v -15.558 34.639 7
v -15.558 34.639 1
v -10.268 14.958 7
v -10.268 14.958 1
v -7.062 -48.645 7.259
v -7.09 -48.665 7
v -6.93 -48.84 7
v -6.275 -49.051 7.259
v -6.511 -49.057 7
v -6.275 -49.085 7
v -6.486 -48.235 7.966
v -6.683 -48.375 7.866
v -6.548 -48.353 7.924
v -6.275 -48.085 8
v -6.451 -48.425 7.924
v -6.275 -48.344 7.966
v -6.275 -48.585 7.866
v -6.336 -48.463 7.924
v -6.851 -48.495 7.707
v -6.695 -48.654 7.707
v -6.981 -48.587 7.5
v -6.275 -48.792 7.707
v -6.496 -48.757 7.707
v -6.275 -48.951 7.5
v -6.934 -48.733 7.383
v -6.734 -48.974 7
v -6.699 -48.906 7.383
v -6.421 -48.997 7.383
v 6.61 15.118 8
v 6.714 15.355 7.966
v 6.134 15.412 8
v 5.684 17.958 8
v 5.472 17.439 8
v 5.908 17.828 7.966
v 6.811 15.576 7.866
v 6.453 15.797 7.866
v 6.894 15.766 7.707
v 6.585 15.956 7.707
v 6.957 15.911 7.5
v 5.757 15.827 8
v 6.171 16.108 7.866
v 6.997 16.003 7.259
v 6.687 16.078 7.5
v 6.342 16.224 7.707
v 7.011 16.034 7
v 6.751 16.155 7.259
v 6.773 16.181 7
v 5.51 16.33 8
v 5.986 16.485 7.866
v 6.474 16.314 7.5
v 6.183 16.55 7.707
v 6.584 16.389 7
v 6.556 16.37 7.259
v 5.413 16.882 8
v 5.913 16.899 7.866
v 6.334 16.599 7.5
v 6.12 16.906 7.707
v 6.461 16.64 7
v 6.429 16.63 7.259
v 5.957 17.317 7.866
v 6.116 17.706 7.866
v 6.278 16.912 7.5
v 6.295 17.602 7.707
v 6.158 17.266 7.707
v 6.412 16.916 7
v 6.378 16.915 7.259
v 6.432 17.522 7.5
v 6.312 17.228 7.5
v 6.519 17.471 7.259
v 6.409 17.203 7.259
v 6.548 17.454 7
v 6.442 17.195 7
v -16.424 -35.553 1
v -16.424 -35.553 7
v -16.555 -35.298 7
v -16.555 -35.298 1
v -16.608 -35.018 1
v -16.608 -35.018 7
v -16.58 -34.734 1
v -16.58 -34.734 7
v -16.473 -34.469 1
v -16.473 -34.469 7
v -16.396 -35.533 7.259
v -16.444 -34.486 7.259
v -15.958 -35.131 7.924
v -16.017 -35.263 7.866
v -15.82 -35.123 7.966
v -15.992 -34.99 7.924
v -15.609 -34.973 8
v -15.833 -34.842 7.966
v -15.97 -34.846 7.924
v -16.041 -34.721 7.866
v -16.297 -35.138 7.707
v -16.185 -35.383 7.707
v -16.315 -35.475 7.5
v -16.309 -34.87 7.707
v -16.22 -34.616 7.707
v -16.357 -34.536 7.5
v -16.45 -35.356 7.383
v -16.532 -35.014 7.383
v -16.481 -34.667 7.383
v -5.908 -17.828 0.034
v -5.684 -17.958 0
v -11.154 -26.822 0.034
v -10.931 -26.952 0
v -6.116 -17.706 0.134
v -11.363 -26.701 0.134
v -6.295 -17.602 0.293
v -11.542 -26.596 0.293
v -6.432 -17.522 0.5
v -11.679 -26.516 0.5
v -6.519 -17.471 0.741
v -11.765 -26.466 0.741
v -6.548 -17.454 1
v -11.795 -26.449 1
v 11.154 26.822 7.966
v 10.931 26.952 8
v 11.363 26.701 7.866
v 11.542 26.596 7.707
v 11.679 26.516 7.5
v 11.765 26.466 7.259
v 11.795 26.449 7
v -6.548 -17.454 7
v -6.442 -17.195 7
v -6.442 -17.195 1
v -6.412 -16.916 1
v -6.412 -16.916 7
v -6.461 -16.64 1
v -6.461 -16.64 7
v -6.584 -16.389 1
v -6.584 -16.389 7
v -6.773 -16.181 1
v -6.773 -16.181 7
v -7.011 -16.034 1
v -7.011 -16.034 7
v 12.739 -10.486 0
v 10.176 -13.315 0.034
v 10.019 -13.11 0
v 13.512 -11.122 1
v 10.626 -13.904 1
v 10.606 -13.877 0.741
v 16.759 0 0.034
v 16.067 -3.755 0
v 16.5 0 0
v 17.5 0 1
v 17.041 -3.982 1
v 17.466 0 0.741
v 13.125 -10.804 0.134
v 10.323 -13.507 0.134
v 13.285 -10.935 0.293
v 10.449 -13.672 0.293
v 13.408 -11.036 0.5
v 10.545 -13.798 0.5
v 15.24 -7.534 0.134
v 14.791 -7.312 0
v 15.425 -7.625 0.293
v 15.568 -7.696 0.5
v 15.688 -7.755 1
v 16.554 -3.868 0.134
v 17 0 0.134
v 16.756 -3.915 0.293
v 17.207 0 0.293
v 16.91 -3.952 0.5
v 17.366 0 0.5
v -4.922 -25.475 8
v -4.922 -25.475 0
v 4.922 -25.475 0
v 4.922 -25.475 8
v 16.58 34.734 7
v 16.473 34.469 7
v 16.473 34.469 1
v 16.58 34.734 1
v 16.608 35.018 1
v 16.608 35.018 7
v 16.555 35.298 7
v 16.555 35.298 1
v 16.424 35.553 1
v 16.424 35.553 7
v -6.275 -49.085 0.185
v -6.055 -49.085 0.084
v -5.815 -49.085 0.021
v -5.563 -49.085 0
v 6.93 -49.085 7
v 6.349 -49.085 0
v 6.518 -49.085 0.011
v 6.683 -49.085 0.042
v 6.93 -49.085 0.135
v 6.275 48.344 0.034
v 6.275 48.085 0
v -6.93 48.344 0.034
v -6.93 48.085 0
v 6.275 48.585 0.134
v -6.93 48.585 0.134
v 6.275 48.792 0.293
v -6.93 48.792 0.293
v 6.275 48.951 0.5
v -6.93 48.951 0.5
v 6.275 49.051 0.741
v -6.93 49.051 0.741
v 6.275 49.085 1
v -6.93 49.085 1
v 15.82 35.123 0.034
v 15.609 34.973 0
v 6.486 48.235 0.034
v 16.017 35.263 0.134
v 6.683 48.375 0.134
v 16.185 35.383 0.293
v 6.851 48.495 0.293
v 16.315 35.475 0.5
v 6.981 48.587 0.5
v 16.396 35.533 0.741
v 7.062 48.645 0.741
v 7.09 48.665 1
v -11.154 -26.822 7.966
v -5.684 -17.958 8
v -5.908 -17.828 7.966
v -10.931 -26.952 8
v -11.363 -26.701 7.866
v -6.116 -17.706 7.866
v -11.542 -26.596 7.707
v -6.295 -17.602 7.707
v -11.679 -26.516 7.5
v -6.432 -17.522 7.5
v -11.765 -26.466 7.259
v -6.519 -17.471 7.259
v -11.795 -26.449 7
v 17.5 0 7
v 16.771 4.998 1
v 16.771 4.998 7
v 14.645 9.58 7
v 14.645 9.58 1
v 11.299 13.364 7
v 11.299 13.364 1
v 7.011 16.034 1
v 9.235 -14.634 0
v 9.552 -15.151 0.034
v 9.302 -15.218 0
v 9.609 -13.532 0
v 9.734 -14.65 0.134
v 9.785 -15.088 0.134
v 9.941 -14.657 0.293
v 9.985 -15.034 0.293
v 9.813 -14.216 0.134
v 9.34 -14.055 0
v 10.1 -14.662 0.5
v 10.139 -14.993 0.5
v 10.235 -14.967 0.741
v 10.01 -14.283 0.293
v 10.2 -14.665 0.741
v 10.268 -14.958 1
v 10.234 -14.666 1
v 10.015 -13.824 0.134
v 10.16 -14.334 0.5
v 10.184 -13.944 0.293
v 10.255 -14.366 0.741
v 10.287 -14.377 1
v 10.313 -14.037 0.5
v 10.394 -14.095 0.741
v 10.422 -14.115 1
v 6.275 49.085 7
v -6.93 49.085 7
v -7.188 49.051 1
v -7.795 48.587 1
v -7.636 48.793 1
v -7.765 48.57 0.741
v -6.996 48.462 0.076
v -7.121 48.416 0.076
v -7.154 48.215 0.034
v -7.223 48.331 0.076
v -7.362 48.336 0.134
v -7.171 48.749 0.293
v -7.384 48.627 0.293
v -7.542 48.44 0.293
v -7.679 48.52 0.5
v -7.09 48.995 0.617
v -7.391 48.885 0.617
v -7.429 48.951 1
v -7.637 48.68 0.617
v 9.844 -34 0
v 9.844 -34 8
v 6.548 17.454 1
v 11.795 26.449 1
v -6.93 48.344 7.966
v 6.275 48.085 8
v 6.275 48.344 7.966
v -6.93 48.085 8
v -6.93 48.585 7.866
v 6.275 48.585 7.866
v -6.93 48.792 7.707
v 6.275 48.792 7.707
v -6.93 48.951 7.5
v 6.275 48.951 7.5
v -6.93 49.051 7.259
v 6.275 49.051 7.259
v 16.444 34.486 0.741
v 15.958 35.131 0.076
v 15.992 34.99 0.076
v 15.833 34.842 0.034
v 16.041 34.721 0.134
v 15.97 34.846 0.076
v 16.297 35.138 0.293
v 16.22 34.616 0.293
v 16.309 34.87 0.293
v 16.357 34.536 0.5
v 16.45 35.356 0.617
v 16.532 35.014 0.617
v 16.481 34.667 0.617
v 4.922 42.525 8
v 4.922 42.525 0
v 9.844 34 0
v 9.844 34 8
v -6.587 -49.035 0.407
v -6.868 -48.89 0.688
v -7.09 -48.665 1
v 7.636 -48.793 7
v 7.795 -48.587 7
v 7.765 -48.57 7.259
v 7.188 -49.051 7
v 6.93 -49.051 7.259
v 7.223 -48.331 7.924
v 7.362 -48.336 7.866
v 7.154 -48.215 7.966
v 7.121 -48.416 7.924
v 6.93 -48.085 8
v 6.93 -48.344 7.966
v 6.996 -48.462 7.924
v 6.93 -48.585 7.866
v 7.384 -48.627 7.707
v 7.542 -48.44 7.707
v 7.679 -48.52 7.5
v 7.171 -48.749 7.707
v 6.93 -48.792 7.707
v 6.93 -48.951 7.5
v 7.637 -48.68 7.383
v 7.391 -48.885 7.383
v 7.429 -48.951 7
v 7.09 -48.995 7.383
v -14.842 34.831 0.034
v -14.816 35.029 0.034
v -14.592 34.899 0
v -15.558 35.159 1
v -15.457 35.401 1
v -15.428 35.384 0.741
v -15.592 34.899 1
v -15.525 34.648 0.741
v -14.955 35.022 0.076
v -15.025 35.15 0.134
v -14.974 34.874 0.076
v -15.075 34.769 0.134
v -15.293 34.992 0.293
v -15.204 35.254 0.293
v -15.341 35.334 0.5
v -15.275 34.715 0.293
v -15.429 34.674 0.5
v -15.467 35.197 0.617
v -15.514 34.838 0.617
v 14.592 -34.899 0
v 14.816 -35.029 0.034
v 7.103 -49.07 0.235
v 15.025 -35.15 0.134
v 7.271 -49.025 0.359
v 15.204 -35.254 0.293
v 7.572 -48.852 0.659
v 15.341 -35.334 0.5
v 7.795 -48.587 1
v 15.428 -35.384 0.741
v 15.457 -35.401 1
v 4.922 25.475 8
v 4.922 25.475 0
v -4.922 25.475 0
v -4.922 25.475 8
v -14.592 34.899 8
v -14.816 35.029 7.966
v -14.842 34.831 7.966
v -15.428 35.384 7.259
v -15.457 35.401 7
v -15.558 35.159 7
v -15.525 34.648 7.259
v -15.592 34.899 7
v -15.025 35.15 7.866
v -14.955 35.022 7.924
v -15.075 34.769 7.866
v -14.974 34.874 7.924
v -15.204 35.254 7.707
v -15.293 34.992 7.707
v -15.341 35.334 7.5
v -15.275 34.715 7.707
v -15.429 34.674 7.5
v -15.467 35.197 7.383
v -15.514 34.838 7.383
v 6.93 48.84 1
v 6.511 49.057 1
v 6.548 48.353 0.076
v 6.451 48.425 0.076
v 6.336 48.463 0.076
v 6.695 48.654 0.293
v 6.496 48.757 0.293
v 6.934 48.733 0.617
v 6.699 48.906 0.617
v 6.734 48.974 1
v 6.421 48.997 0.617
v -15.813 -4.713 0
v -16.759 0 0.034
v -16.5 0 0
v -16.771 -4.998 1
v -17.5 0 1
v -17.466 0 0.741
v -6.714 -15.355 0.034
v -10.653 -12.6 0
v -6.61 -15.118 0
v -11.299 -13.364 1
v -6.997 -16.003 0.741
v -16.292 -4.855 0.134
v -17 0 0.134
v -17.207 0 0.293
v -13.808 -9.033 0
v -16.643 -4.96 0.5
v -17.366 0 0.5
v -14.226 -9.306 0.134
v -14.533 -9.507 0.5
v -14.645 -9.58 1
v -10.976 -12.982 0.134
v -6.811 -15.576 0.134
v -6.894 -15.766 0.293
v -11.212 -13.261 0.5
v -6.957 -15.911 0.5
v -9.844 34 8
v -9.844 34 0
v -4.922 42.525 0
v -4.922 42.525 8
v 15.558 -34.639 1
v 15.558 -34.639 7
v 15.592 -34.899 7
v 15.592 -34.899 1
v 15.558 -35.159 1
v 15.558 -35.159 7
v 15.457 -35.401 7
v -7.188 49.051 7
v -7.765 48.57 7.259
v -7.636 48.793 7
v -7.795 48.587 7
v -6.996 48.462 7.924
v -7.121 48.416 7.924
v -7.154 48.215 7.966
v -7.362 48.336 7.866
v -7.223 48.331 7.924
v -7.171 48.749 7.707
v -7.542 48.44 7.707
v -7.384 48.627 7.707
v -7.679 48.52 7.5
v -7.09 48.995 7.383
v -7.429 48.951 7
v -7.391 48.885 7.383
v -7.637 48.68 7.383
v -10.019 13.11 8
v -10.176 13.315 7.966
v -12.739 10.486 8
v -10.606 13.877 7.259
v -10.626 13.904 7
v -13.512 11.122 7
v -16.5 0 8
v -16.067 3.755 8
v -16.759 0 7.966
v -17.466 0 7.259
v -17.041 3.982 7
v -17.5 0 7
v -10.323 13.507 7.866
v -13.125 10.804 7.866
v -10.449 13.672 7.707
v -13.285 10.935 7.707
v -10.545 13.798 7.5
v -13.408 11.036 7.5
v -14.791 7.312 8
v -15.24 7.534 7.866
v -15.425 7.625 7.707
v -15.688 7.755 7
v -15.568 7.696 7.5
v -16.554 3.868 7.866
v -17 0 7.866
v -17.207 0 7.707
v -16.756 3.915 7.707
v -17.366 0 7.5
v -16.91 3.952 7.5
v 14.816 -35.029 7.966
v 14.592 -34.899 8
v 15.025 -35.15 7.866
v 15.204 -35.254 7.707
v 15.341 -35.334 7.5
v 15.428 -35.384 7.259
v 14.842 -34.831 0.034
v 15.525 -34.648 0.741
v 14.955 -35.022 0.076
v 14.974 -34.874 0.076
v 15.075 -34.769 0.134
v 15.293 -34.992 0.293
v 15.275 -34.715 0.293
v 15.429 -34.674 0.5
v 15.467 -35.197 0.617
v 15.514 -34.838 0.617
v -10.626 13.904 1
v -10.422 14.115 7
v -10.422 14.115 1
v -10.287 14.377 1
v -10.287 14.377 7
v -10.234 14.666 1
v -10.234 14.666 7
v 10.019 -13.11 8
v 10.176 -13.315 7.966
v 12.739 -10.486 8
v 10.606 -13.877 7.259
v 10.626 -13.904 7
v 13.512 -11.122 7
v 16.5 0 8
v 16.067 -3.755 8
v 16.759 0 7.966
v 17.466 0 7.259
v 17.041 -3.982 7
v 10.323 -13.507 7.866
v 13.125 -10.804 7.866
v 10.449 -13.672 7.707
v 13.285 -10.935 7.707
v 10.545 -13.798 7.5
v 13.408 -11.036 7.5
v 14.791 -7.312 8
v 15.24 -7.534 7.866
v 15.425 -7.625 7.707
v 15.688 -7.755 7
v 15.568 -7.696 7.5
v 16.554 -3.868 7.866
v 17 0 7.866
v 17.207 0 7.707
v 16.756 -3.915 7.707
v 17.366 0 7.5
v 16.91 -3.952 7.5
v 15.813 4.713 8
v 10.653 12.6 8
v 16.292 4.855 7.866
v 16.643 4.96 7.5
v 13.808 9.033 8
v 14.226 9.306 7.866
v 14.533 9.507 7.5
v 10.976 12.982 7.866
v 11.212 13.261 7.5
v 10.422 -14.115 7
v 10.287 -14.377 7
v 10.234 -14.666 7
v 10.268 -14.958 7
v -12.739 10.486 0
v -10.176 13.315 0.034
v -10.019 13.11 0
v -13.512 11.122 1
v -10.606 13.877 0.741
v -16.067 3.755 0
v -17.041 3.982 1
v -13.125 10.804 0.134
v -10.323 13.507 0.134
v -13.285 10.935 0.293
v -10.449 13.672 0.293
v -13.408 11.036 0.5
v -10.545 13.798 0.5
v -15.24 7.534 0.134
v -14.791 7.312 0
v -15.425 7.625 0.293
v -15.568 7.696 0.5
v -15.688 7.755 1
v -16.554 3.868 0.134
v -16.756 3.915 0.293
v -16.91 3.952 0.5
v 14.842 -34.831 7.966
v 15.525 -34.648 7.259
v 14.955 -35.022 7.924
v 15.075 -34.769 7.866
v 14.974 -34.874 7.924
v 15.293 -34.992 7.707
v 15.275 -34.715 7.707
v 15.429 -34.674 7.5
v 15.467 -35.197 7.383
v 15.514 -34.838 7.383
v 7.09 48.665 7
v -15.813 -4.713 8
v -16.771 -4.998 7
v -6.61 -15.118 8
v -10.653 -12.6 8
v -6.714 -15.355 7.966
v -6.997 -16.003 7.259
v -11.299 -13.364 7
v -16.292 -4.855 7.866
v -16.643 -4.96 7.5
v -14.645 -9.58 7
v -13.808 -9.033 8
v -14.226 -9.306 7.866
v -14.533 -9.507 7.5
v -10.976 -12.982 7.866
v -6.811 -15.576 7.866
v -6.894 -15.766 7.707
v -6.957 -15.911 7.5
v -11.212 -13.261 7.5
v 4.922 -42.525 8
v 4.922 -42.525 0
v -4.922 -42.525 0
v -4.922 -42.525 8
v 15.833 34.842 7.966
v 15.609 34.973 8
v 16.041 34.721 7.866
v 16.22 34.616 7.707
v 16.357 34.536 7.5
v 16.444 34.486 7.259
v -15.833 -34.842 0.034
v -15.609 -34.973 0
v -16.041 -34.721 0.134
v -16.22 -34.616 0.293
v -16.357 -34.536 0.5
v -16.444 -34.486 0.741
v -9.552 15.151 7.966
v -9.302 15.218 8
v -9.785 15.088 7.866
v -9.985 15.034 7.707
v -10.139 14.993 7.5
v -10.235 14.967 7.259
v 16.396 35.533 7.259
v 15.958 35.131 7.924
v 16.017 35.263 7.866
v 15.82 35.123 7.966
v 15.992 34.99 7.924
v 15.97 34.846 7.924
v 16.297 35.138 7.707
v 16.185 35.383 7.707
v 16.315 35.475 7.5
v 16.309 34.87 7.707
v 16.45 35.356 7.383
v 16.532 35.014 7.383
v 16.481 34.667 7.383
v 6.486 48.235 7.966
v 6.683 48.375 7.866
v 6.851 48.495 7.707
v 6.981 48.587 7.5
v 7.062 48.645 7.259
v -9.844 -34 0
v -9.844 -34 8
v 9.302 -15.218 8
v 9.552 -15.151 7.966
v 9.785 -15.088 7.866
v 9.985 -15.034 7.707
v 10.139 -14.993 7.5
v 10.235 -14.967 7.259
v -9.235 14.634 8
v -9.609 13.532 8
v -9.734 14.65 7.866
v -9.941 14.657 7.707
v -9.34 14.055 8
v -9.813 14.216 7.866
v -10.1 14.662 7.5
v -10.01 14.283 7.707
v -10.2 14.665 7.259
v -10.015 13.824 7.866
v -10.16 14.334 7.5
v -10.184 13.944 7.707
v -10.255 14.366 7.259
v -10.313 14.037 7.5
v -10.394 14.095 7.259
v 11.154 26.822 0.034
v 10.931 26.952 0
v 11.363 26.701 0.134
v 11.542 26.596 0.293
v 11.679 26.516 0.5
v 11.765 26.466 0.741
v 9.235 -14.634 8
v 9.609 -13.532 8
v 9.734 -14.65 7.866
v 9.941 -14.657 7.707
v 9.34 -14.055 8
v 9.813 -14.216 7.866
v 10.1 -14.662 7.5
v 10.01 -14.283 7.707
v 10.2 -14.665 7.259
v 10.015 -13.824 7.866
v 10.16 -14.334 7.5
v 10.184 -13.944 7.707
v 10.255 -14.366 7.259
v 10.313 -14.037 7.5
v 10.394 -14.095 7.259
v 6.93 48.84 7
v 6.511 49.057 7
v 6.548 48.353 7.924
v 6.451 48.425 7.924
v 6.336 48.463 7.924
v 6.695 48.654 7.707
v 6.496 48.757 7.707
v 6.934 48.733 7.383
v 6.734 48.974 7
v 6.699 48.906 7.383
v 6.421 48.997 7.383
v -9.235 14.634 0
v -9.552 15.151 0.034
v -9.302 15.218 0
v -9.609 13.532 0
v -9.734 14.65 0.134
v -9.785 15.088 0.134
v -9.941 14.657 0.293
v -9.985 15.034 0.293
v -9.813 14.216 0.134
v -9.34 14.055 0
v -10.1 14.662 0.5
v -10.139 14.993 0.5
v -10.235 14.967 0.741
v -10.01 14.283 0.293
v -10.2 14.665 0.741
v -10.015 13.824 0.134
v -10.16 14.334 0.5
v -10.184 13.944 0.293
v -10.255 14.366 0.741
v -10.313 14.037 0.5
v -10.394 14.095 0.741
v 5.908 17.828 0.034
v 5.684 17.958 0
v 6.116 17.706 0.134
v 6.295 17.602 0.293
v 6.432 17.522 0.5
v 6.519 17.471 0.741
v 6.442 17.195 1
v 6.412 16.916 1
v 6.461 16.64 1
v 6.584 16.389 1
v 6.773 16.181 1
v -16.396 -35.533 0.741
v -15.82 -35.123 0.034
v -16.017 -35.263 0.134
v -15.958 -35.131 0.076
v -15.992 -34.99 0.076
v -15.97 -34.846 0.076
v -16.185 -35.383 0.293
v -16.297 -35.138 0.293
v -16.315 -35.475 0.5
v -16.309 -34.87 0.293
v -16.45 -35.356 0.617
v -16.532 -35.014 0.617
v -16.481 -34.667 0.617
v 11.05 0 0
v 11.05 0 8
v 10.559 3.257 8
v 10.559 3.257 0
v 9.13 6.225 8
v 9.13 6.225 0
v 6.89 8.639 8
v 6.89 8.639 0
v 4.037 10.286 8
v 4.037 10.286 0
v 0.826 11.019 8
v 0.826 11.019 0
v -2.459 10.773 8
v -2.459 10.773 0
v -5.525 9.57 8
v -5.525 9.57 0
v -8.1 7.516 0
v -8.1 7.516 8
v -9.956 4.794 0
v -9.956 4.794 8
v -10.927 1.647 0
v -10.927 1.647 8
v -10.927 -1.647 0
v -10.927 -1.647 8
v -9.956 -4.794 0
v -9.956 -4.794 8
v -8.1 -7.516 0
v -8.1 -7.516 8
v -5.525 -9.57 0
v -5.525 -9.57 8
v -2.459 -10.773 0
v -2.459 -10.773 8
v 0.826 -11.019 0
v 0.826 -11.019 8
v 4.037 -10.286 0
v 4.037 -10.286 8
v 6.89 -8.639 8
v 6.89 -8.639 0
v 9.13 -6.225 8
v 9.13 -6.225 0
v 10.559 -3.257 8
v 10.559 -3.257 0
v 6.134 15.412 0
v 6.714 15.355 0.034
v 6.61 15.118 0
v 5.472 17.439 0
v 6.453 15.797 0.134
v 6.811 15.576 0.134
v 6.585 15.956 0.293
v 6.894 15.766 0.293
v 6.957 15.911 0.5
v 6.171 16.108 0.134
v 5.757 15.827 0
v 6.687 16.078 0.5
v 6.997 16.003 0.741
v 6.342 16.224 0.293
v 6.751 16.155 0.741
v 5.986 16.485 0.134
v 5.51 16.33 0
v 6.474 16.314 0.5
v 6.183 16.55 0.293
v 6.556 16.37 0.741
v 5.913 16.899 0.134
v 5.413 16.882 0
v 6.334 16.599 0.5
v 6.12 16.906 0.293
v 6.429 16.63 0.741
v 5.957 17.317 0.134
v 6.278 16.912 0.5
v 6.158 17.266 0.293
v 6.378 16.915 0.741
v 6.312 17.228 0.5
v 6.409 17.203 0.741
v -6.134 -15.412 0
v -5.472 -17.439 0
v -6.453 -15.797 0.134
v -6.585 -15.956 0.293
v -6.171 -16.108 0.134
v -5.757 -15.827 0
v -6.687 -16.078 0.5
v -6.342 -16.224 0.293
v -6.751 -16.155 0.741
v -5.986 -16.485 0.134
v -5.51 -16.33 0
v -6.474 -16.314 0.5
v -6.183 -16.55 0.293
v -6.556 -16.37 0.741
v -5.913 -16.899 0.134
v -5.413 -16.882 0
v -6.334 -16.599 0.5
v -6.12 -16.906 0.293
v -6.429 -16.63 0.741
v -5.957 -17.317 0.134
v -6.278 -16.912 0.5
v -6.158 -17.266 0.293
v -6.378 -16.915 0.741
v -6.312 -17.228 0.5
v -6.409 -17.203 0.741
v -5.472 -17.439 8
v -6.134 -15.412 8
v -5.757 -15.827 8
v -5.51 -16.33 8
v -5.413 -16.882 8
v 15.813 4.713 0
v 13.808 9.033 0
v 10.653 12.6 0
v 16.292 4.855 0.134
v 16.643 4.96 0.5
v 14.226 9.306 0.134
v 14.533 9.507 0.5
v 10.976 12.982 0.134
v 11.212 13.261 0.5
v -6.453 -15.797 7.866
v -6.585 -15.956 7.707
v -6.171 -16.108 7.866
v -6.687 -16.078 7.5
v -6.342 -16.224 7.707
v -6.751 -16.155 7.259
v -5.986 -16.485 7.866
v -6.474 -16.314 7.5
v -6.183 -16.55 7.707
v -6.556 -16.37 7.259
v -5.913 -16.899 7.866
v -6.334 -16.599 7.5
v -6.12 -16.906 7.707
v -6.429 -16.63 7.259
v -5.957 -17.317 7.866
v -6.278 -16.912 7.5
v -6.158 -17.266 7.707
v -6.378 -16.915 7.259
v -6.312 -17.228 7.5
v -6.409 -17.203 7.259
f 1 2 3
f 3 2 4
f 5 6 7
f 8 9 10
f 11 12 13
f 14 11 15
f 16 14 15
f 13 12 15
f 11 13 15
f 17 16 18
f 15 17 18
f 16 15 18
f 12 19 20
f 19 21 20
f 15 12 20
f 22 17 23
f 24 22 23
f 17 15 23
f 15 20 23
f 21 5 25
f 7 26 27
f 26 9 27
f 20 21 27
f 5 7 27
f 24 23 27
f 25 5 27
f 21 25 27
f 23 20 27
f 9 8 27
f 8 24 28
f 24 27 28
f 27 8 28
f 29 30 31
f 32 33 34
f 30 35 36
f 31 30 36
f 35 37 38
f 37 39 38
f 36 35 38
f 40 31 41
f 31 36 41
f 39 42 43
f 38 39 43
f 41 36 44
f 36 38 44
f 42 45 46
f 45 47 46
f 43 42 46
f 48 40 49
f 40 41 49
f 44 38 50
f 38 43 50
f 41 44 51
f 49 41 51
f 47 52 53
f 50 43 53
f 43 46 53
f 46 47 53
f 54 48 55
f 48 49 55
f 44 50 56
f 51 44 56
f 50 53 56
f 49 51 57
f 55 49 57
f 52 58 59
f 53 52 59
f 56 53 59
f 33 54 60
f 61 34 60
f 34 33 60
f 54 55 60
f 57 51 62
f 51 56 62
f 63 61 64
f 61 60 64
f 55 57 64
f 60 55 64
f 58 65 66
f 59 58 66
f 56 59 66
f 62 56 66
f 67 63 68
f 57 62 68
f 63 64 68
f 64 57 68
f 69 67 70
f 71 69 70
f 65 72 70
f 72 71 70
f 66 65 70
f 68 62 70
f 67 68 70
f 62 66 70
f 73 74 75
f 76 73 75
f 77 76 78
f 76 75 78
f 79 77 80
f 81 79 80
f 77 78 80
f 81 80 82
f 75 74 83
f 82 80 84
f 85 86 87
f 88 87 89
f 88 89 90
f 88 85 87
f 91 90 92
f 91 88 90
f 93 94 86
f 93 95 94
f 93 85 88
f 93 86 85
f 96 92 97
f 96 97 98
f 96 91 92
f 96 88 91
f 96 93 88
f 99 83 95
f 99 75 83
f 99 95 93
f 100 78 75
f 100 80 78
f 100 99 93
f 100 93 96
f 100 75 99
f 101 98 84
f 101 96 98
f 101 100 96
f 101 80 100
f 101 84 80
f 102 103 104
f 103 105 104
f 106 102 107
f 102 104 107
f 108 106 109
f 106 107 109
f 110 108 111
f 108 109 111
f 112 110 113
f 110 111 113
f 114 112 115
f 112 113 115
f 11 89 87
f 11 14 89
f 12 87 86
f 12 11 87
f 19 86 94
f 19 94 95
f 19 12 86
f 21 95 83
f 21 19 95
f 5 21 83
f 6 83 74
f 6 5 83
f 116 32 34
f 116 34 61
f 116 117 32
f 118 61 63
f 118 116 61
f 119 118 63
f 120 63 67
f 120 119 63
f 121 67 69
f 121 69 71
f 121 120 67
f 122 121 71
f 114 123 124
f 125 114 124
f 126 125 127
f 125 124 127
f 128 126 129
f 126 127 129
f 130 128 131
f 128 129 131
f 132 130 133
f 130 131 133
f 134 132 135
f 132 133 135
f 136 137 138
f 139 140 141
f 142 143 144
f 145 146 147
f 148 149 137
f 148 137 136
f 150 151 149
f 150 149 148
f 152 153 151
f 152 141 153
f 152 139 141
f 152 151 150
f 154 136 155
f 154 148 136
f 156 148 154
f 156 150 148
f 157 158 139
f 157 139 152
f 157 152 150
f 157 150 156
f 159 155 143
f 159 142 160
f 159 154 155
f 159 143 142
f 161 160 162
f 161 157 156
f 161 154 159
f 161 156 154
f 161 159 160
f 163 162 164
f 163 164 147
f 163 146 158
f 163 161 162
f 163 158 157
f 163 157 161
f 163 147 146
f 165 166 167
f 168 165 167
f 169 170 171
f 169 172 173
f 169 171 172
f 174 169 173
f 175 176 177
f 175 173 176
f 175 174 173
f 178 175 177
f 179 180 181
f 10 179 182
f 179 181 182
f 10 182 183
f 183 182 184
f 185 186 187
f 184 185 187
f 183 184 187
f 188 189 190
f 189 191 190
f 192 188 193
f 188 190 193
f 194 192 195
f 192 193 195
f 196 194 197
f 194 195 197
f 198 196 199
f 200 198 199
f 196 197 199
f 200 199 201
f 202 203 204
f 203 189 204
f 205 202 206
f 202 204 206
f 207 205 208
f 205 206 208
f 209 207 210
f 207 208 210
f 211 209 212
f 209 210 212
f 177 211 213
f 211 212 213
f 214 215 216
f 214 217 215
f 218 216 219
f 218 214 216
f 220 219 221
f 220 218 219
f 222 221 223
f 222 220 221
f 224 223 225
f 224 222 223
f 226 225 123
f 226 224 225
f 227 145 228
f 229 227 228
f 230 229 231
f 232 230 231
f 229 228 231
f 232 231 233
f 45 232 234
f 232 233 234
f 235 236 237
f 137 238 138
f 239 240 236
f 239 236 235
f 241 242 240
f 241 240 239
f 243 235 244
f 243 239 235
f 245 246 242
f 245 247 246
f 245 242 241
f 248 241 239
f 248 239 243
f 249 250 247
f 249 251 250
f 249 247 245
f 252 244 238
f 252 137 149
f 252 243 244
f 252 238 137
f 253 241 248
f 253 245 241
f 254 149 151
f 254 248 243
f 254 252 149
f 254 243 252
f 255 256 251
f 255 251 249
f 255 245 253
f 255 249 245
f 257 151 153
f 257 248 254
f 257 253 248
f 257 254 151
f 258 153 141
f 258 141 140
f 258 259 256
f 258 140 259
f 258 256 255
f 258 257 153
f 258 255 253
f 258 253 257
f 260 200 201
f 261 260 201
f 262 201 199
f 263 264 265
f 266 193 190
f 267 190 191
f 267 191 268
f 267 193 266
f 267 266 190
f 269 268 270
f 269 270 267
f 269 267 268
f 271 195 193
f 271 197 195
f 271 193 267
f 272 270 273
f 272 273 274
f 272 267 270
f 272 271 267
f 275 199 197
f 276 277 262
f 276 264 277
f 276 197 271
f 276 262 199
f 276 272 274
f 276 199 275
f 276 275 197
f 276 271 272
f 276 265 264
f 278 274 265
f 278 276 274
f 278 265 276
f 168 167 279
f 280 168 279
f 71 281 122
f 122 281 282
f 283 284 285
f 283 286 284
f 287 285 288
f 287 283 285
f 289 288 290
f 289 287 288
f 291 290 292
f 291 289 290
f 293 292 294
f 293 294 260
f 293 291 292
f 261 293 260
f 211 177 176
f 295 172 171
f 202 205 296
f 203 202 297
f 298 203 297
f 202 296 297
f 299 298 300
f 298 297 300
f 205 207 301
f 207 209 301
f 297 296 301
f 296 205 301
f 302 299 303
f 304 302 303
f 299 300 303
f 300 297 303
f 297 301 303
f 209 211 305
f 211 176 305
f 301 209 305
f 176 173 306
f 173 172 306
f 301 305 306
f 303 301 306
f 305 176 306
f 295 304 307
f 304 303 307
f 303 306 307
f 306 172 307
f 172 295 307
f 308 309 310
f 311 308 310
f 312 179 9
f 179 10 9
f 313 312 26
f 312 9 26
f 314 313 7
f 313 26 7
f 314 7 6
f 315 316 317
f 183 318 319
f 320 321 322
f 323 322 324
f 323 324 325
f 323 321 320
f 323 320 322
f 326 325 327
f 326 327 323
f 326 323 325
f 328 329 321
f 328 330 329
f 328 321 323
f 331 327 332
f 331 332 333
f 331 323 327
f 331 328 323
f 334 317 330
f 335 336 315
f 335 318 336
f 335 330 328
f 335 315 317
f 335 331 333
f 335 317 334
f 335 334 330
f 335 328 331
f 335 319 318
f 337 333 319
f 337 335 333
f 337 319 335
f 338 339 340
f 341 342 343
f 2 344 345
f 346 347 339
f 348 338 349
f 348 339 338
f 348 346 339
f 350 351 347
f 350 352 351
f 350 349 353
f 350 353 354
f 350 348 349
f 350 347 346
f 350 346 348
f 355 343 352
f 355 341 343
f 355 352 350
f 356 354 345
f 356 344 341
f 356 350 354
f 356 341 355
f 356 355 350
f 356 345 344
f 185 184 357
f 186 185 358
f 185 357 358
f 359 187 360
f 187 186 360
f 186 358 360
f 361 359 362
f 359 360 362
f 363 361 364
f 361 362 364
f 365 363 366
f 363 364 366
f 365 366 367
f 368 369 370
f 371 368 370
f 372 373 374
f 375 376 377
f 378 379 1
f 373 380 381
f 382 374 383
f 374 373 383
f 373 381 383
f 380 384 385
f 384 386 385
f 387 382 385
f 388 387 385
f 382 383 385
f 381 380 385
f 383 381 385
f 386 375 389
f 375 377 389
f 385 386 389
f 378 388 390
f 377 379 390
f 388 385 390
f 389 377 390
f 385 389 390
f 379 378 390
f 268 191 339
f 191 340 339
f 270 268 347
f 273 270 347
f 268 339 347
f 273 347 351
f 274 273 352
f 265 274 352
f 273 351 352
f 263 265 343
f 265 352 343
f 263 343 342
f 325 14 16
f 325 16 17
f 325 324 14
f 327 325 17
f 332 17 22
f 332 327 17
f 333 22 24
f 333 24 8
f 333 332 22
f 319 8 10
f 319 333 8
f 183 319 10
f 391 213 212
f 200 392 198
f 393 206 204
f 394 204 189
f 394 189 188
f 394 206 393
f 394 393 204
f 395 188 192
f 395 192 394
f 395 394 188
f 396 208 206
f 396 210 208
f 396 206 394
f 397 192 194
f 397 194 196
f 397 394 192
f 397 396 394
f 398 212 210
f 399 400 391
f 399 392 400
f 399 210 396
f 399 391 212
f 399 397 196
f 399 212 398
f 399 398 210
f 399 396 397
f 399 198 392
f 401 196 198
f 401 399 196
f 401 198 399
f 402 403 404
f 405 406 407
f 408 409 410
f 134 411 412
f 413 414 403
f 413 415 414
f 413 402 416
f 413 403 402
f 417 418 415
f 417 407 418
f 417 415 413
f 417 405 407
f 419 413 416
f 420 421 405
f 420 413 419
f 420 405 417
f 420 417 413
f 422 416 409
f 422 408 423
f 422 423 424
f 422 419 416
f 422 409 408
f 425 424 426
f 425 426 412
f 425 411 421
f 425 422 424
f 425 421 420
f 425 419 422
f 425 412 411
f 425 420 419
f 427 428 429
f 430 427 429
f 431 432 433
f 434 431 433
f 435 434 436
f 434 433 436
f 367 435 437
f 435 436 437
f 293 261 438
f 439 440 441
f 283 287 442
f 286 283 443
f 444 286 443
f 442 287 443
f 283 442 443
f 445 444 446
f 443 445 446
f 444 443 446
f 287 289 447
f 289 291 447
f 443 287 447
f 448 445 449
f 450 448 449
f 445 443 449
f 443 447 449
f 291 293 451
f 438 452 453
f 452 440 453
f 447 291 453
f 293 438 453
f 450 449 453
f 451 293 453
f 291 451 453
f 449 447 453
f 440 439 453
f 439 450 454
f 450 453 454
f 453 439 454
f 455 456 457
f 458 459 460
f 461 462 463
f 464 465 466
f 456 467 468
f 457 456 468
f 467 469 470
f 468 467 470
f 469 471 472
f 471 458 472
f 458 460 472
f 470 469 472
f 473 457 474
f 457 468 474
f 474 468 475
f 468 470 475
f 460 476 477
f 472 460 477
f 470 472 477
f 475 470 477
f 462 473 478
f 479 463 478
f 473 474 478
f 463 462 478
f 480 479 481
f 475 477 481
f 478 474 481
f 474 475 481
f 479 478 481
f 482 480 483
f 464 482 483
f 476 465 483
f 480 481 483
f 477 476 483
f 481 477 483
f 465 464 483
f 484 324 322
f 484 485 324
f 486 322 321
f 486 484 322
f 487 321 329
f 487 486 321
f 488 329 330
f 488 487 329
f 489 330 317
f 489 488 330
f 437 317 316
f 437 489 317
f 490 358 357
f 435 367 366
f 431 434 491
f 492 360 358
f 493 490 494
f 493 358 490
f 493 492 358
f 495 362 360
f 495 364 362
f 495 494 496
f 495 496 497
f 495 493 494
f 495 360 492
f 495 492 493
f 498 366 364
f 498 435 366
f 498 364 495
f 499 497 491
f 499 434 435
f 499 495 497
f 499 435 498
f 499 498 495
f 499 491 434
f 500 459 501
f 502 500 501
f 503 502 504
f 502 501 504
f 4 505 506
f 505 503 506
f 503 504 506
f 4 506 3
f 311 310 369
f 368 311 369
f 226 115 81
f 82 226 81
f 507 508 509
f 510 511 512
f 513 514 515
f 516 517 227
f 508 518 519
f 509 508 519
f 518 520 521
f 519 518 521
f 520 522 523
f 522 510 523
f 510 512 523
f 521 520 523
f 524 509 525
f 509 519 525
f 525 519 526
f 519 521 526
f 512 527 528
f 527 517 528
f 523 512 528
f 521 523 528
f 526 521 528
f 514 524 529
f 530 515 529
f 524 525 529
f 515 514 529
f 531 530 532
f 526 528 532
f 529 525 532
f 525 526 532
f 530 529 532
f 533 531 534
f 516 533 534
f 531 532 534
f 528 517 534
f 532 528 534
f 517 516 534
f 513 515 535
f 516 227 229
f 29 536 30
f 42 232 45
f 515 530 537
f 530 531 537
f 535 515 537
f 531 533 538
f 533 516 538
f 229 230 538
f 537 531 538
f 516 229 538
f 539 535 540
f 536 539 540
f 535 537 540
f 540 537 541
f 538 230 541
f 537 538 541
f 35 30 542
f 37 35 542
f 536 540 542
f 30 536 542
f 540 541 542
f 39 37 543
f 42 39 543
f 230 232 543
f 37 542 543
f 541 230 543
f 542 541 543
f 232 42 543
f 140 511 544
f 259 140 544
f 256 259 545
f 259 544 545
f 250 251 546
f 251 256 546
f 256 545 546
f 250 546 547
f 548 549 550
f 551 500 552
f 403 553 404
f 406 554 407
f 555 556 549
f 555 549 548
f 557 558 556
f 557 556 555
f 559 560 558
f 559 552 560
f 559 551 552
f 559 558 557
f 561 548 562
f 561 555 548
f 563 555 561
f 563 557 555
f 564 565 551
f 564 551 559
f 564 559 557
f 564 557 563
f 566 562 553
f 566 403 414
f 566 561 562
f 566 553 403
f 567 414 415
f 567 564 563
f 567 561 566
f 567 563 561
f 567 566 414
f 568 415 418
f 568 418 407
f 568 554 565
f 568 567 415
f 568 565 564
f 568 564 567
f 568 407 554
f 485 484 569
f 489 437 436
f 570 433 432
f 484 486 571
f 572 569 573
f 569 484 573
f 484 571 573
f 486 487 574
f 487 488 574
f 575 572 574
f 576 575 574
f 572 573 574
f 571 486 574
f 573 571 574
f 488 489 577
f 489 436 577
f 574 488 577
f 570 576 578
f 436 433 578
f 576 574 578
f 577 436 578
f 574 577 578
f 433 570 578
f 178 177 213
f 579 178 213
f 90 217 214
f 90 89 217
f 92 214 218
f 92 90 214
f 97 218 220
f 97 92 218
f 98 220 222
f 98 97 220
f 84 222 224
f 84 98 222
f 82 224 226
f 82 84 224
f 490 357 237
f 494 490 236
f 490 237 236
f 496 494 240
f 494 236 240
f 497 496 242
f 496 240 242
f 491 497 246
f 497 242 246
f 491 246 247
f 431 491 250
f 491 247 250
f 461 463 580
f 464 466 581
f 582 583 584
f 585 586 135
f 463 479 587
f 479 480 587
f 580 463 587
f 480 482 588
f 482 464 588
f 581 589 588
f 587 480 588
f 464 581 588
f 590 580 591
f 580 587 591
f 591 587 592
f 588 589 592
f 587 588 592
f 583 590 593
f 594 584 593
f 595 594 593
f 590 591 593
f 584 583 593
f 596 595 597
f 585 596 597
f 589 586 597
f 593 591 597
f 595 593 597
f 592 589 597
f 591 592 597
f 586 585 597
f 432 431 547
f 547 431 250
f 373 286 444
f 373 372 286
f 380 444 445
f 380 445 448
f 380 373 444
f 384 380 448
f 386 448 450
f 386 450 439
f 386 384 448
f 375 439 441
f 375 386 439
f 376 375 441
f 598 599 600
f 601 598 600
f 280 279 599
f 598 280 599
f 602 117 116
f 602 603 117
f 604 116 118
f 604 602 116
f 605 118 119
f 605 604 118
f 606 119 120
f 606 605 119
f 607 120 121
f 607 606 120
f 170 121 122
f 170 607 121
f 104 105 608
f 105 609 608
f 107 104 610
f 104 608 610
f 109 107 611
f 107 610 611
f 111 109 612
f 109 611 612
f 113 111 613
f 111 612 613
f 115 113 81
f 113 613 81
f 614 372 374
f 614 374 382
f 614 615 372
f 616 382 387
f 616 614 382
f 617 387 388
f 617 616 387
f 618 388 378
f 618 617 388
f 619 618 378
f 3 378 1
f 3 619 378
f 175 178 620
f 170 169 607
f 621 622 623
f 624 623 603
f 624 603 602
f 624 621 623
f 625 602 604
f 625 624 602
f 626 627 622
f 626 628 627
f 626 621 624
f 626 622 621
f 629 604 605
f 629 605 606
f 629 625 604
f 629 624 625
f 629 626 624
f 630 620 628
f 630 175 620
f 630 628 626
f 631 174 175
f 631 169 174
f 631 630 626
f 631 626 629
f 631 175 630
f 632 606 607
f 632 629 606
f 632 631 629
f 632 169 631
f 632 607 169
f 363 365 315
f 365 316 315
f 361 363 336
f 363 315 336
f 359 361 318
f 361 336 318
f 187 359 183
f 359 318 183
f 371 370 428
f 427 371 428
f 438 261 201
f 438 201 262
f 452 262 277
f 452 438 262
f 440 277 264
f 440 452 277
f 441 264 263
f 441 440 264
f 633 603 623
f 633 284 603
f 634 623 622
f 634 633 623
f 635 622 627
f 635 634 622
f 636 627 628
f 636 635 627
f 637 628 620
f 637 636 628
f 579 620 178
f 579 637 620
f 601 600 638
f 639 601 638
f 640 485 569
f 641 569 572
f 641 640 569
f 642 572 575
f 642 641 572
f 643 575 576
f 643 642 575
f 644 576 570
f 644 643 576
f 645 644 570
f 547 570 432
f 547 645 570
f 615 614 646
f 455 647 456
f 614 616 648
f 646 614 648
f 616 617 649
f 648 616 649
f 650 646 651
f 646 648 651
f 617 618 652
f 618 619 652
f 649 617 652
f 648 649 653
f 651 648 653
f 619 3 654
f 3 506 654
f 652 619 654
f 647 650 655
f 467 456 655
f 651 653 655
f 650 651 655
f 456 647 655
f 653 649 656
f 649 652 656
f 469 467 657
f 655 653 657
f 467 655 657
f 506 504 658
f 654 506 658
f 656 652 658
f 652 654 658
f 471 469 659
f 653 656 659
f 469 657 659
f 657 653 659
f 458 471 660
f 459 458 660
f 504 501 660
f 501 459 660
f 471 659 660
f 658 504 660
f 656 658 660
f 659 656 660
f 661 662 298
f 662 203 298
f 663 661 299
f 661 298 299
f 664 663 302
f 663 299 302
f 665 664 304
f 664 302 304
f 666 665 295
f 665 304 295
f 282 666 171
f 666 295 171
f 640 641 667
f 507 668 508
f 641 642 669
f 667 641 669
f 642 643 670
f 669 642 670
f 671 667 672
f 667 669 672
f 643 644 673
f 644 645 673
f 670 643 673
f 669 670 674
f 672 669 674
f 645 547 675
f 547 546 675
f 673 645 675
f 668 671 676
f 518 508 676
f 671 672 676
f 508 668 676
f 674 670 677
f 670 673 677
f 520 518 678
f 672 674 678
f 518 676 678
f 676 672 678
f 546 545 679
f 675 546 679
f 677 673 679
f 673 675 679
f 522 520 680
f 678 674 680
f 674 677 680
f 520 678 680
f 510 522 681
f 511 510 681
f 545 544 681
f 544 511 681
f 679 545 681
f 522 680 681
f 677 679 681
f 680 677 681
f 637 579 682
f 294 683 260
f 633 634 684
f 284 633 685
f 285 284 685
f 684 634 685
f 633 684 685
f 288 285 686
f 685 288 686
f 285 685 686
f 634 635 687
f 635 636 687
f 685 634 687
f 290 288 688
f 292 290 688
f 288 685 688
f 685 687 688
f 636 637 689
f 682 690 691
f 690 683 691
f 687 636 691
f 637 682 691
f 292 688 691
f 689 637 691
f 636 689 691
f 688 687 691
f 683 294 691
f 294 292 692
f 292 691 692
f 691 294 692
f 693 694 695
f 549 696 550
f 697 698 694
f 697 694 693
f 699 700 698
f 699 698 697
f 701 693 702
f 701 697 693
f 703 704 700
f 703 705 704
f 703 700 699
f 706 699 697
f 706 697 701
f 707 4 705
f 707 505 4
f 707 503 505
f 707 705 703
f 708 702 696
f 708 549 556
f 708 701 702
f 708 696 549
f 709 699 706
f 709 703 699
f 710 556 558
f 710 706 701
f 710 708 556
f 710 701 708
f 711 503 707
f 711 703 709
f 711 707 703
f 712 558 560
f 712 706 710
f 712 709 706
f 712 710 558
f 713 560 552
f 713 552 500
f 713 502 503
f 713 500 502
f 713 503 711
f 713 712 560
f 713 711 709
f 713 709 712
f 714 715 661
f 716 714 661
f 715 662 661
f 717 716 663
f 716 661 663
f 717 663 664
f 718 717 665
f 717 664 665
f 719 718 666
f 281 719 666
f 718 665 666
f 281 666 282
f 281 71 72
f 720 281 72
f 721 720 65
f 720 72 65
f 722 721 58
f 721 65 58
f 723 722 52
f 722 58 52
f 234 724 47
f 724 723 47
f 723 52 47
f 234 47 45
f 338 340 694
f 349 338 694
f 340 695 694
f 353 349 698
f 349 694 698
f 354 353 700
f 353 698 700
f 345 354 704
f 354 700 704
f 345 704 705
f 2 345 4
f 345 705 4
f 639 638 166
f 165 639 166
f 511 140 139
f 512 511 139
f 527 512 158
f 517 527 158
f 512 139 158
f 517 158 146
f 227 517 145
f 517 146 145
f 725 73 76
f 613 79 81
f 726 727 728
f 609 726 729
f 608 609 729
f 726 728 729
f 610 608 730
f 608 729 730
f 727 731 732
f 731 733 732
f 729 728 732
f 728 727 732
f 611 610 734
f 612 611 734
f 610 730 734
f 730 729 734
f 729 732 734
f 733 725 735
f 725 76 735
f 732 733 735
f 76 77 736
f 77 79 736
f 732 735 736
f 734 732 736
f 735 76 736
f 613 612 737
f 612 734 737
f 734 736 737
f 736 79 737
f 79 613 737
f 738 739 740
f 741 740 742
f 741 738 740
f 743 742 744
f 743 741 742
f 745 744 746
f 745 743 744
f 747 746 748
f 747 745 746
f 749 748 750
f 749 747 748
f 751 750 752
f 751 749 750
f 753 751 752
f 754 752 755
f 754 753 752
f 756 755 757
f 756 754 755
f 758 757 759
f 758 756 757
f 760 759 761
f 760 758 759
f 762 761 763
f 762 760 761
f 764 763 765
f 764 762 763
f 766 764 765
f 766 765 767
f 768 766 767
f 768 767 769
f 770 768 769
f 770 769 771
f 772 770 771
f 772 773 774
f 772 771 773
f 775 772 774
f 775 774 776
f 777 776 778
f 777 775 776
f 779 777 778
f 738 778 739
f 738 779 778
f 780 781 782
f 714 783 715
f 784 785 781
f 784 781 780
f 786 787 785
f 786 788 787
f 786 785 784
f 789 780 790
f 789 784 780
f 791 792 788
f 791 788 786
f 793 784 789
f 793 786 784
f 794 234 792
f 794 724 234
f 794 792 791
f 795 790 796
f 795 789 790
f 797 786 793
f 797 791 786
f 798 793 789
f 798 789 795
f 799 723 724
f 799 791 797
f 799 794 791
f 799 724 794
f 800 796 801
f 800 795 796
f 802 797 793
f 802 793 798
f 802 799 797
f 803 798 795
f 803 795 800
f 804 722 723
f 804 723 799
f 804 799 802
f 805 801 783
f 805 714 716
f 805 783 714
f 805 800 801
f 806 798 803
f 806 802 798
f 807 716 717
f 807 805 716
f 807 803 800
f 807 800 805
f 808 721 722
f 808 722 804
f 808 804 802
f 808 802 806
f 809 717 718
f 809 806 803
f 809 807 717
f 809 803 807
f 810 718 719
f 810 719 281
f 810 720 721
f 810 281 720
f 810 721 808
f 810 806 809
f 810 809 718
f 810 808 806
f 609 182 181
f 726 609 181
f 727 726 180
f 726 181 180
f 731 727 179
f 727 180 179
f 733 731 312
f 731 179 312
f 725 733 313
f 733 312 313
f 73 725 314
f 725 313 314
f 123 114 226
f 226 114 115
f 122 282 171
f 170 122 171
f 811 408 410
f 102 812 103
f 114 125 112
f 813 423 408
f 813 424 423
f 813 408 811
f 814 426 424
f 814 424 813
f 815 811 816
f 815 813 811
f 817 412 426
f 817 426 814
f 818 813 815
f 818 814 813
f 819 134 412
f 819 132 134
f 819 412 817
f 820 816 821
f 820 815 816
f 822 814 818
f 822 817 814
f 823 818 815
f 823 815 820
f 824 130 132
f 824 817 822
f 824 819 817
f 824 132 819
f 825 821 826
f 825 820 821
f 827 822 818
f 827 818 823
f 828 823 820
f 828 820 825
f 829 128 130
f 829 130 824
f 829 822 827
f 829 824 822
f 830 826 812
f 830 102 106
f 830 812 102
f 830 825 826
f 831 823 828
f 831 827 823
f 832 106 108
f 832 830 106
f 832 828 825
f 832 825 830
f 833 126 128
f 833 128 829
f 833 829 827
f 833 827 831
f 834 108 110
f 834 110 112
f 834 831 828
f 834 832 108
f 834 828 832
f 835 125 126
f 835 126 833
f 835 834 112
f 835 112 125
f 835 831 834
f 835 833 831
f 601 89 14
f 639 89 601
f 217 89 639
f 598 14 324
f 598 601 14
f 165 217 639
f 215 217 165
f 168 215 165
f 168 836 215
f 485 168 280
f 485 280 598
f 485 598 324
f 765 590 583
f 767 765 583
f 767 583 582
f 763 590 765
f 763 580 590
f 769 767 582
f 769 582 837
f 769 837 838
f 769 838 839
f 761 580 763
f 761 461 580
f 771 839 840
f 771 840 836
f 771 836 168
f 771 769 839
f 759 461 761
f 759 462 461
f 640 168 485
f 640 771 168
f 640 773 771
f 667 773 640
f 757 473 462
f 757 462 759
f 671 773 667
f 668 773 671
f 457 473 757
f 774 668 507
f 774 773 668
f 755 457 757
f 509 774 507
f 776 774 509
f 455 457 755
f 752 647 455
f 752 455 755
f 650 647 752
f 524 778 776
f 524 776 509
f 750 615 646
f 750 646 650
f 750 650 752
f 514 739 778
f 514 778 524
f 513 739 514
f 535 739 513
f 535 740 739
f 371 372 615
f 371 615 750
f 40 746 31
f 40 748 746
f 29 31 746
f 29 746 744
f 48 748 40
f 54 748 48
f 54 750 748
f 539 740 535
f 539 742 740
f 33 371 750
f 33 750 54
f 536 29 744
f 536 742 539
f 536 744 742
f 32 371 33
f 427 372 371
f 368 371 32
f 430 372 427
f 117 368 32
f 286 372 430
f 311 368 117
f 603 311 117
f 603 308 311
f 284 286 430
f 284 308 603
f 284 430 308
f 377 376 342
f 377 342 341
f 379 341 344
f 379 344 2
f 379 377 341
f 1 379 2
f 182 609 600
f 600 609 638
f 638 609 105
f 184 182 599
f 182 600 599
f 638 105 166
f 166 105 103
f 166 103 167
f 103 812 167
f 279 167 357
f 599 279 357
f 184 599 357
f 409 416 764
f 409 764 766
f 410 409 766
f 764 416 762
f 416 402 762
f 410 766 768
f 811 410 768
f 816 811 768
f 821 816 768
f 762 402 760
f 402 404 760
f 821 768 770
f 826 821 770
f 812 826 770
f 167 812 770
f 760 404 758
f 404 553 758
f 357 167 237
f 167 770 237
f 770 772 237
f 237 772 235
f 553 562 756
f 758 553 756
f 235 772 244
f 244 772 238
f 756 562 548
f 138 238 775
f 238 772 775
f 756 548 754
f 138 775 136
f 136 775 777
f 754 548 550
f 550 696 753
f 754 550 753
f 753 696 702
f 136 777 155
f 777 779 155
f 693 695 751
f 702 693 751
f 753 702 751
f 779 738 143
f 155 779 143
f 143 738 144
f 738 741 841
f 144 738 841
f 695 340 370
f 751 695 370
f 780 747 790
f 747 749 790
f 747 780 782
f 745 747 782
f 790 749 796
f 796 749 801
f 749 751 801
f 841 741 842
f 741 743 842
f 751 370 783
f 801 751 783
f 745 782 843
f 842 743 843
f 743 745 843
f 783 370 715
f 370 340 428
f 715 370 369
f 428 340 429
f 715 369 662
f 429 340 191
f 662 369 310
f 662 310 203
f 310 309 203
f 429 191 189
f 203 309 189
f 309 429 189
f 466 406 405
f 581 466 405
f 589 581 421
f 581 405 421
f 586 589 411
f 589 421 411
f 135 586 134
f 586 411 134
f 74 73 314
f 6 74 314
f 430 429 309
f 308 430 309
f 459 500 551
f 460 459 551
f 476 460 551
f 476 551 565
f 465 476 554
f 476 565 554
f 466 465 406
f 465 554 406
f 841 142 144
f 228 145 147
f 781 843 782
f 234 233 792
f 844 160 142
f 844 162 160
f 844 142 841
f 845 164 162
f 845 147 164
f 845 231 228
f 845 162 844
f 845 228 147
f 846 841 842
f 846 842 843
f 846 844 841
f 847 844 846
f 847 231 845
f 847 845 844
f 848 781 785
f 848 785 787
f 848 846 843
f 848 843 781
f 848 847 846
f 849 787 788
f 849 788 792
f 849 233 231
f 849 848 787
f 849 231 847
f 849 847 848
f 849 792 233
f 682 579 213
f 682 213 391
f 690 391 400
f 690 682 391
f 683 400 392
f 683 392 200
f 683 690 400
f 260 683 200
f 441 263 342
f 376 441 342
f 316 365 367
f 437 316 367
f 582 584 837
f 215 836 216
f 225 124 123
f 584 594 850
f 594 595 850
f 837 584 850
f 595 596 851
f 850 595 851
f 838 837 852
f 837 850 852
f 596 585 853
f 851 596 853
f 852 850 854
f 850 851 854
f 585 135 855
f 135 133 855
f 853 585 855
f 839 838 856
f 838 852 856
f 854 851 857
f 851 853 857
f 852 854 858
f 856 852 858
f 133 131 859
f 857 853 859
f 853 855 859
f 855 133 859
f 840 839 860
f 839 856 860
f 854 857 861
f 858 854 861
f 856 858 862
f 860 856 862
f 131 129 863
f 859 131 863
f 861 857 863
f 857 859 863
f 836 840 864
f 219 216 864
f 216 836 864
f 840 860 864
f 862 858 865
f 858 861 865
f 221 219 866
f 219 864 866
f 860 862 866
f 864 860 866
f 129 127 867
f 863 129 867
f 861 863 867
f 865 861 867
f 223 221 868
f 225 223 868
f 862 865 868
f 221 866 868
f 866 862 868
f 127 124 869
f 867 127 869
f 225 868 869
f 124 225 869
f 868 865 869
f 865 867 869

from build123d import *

# Parameters (mm, degrees)
F0_R     = 11.05
F1_DEPTH = 8
F2_COUNT = 2
F3_F1_R  = 1
F3_F2_R  = 1


with BuildPart() as f1:
    # F0 (on Top) → F1 (new body)
    with BuildSketch(Plane.XY):
        with BuildLine():
            ThreePointArc((-10.0903869269, 14.2980450295), (-8.0519633873, -15.5375636961), (17.5, 0))
            ThreePointArc((17.5, 0), (14.3285222663, 10.0470617428), (5.9636057526, 16.4525197592))
            ThreePointArc((5.9636057526, 16.4525197592), (-2.3276642918, 17.3445086106), (-10.0903869269, 14.2980450295))
        make_face()
        Circle(F0_R, mode=Mode.SUBTRACT)
        with BuildLine():
            ThreePointArc((-10.0903869269, 14.2980450295), (-2.3276642918, 17.3445086106), (5.9636057526, 16.4525197592))
            Line((5.9636057526, 16.4525197592), (11.7946313694, 26.4485646039))
            Line((11.7946313694, 26.4485646039), (16.7984124273, 35.0264757872))
            Line((16.7984124273, 35.0264757872), (6.7908498459, 49.0847229958))
            Line((6.7908498459, 49.0847229958), (-7.5056743808, 49.0847229958))
            Line((-7.5056743808, 49.0847229958), (-15.6662040079, 35.0410211056))
            Line((-15.6662040079, 35.0410211056), (-10.0903869269, 14.2980450295))
        make_face()
        Polygon((-4.9219110448, 42.525), (4.9219110448, 42.525), (9.8438220897, 34), (4.9219110448, 25.475), (-4.9219110448, 25.475), (-9.8438220897, 34), align=None, mode=Mode.SUBTRACT)
    extrude(amount=F1_DEPTH)

    # F2: F1 ×2 about axis
    f2_axis = Axis((0, 0, 0), (0, 0, 1))


with BuildPart() as f1_1:
    add(f1.part)
    for i in range(1, F2_COUNT):
        add(f1.part.rotate(f2_axis, i * 360 / F2_COUNT))

    # F3: fillet of radius 1 on 31 edges, made by hand

    # F3_f1
    f3_f1_edges = [f1_1.edges().sort_by_distance(p)[0] for p in [
        (10.0903869269, -14.2980450295, 4),
        (5.9636057526, 16.4525197592, 4),
        (-10.0903869269, 14.2980450295, 4),
        (-5.9636057526, -16.4525197592, 4),
    ]]
    fillet(f3_f1_edges, radius=F3_F1_R)

    # F3_f2
    f3_f2_edges = [f1_1.edges().sort_by_distance(p)[0] for p in [
        (7.5056743808, -49.0847229958, 4),
        (15.6662040079, -35.0410211056, 4),
        (11.5859391943, -42.0628720507, 0),
        (11.5859391943, -42.0628720507, 8),
        (12.9670524021, -24.9997237726, 0),
        (12.9670524021, -24.9997237726, 8),
        (16.7984124273, 35.0264757872, 4),
        (11.6731868984, 26.2403740629, 0),
        (11.6731868984, 26.2403740629, 8),
        (6.7908498459, 49.0847229958, 4),
        (11.7946311366, 42.0555993915, 0),
        (11.7946311366, 42.0555993915, 8),
        (-7.5056743808, 49.0847229958, 4),
        (-0.3574122675, 49.0847229958, 0),
        (-0.3574122675, 49.0847229958, 8),
        (-15.6662040079, 35.0410211056, 4),
        (-11.5859391943, 42.0628720507, 0),
        (-11.5859391943, 42.0628720507, 8),
        (-12.9670524021, 24.9997237726, 0),
        (-12.9670524021, 24.9997237726, 8),
        (-16.7984124273, -35.0264757872, 4),
        (-11.6731868984, -26.2403740629, 0),
        (-11.6731868984, -26.2403740629, 8),
        (-6.7908498459, -49.0847229958, 4),
        (-11.7946311366, -42.0555993915, 0),
        (-11.7946311366, -42.0555993915, 8),
        (0.3574122675, -49.0847229958, 8),
        (-6.4610233416, -16.640341221, 8),
        (-6.4610233416, -16.640341221, 0),
        (-10.2868728829, 14.376857273, 8),
        (-10.2868728829, 14.376857273, 0),
        (6.4610233416, 16.640341221, 8),
        (6.4610233416, 16.640341221, 0),
        (10.2868728829, -14.376857273, 8),
        (10.2868728829, -14.376857273, 0),
    ]]
    fillet(f3_f2_edges, radius=F3_F2_R)


solid = f1_1.part
